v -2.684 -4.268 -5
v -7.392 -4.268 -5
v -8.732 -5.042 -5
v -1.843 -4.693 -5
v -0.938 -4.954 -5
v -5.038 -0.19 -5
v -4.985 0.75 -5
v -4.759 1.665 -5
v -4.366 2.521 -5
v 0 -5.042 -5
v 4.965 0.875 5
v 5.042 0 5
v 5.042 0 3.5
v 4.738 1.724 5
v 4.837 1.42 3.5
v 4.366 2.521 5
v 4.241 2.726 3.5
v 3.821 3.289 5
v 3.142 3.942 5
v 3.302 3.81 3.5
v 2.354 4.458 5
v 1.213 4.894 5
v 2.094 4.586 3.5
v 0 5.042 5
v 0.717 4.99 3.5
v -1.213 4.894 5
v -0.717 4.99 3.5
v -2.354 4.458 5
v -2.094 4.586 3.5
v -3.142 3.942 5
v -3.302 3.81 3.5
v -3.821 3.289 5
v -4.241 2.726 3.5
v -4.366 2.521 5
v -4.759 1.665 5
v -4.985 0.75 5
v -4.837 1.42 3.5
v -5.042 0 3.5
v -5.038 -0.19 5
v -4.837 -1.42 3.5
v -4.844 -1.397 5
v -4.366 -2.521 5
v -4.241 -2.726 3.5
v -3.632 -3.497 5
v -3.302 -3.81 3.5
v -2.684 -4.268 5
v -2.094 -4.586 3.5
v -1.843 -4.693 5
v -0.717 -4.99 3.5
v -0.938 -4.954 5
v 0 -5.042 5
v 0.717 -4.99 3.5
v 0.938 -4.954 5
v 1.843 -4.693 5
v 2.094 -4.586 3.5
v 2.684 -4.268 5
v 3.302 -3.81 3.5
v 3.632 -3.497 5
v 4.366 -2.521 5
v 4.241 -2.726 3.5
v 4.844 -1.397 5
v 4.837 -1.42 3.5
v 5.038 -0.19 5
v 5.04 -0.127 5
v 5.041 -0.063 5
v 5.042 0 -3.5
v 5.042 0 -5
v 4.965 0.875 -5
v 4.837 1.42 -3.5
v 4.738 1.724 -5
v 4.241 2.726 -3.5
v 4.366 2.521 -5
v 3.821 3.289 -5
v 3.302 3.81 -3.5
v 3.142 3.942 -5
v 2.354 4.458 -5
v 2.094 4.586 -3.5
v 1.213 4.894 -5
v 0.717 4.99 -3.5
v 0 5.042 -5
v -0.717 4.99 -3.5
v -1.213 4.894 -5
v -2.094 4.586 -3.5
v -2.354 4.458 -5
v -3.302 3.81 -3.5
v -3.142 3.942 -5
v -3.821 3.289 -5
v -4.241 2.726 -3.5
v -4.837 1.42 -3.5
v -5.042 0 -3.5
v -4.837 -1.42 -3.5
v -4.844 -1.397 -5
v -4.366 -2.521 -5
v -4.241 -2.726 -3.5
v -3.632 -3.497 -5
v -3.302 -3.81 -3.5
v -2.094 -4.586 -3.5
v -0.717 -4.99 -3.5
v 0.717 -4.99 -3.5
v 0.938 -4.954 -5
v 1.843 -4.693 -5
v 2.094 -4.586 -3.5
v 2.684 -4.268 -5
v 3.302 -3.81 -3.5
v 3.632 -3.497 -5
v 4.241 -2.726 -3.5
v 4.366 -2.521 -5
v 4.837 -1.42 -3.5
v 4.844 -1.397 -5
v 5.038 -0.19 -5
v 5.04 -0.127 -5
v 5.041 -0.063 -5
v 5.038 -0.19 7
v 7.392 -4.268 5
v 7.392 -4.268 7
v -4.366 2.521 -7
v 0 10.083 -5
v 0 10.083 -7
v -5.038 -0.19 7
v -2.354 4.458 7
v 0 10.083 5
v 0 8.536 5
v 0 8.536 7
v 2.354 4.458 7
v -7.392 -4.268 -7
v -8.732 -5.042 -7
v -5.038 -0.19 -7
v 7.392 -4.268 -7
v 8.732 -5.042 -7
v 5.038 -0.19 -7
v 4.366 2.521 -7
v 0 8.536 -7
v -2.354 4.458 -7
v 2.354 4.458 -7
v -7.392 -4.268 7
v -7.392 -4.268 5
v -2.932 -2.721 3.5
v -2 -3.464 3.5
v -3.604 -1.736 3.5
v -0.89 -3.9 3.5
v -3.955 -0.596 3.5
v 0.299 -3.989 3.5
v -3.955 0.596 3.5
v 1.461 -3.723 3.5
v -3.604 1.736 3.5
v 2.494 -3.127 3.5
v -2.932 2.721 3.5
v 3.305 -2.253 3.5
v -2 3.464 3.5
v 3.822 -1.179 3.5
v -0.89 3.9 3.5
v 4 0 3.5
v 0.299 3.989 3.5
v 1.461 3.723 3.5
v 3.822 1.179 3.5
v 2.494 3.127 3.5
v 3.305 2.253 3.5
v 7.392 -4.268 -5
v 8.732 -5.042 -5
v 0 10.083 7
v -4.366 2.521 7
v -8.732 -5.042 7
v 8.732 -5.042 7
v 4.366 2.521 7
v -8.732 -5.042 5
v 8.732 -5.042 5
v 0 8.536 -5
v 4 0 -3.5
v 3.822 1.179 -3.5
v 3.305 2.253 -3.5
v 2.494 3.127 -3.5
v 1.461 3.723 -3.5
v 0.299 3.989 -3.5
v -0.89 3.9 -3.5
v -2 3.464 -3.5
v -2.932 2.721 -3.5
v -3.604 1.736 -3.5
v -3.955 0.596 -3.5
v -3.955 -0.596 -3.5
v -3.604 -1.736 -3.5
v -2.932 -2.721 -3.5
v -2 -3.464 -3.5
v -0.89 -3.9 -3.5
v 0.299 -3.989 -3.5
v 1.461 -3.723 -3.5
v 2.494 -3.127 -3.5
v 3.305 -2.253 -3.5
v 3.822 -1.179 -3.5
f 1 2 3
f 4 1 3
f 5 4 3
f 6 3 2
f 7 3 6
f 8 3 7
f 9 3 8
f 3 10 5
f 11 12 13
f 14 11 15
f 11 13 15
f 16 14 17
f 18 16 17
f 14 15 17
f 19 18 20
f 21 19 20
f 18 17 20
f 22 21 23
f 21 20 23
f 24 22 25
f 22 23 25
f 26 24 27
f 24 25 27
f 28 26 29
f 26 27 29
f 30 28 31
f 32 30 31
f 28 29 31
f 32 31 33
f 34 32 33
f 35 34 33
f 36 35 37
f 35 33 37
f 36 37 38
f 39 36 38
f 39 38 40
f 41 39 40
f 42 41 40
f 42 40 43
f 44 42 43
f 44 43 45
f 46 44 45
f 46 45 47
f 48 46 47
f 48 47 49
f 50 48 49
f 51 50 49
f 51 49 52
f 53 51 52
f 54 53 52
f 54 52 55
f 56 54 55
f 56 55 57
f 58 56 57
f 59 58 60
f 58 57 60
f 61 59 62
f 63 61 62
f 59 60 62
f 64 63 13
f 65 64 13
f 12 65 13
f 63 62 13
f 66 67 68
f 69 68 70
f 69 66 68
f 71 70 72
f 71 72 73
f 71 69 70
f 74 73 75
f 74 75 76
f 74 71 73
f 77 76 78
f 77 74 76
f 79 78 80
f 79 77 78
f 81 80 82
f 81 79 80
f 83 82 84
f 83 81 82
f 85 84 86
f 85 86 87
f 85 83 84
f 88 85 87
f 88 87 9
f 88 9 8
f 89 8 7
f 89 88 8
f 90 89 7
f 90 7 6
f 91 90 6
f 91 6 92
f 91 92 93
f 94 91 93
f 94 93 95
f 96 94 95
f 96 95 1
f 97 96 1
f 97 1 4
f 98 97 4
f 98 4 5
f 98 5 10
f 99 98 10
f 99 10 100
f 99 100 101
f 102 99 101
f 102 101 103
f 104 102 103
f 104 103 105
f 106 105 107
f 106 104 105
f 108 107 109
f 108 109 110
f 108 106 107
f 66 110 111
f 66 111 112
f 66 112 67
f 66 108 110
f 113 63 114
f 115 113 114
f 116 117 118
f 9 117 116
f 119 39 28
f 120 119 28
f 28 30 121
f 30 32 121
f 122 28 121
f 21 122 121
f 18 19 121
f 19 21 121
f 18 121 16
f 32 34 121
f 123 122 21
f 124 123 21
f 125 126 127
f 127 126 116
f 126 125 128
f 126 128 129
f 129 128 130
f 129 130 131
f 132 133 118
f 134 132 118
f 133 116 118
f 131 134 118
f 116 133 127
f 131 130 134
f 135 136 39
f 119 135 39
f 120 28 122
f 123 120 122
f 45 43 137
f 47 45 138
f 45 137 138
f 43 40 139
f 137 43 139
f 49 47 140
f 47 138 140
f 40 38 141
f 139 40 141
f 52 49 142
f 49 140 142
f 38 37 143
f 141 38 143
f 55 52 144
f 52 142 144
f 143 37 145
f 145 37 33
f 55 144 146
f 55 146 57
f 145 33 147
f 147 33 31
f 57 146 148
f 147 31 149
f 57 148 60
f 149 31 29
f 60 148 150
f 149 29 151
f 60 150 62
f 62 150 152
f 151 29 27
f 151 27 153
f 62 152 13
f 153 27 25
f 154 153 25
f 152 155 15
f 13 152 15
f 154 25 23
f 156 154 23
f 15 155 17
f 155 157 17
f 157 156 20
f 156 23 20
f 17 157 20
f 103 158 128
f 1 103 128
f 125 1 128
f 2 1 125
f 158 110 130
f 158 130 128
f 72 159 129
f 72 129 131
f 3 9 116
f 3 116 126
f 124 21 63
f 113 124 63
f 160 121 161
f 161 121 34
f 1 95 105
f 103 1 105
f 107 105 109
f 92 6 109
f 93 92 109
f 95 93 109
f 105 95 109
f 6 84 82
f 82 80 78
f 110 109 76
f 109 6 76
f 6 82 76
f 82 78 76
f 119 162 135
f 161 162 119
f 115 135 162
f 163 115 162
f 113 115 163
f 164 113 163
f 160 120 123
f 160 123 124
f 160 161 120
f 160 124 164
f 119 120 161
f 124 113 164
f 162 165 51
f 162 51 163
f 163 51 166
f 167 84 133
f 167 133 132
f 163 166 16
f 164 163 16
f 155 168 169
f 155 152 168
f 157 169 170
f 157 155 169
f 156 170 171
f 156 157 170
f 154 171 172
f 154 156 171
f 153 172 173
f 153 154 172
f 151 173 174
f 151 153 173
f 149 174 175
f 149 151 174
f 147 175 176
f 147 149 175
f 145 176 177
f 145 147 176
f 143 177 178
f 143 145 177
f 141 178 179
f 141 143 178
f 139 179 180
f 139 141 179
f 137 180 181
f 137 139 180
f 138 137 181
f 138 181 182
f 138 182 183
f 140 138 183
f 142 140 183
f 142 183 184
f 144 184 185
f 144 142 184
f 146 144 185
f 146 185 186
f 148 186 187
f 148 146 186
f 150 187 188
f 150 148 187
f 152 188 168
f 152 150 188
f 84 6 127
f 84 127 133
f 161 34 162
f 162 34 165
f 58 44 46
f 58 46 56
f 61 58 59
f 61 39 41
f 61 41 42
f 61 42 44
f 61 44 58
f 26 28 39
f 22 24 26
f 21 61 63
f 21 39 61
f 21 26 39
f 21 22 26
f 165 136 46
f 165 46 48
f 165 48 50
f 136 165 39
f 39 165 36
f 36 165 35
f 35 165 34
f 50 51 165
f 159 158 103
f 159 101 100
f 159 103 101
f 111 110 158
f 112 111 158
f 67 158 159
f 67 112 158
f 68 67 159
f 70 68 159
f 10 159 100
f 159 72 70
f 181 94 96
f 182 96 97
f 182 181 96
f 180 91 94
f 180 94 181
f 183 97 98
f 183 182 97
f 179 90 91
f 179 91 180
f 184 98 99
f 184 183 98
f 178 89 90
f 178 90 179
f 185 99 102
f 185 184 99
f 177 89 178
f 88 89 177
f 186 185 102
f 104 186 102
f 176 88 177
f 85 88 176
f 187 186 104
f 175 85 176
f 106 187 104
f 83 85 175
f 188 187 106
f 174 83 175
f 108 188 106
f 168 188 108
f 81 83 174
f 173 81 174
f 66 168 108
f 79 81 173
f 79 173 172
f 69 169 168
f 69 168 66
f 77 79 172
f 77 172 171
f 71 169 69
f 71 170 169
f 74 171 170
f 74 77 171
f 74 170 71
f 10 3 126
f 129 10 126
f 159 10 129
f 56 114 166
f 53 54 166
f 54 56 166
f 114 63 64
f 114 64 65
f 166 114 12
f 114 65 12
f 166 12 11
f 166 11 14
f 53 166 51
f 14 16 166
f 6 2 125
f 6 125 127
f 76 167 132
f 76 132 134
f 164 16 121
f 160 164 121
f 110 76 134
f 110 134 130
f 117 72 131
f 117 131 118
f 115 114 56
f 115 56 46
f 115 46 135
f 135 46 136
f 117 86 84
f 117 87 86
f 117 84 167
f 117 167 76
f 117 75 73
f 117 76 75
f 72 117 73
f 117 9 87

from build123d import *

# Parameters (mm, degrees)
F0_R     = 4
F1_DEPTH = 3.5
F2_R     = 5.0416218024
F2_R_2   = 4
F3_DEPTH = 1.5
F5_DEPTH = 2


with BuildPart() as f1:
    # F0 (on Top) → F1 (new body)
    with BuildSketch(Plane.XY):
        Circle(F0_R)
    extrude(amount=F1_DEPTH)

    # F2 (on face) → F3 (join)
    with BuildSketch(Plane.XY.offset(3.5)):
        Circle(F2_R)
        Circle(F2_R_2, mode=Mode.SUBTRACT)
        Circle(F2_R_2)
    extrude(amount=F3_DEPTH)

    # F4 (on face) → F5 (join)
    with BuildSketch(Plane.XY.offset(5)):
        with BuildLine():
            ThreePointArc((-2.3542444359, 4.4581928553), (-3.4970506358, 3.6316094571), (-4.3661725175, 2.5208109698))
            ThreePointArc((-4.3661725175, 2.5208109698), (-4.8935913453, 1.2127300373), (-5.0380304856, -0.1902609394))
            Line((-5.0380304856, -0.1902609394), (-2.3542444359, 4.4581928553))
        make_face()
        with BuildLine():
            ThreePointArc((-2.6837860497, -4.2679319158), (-1.3965406905, -4.8443394285), (0, -5.0416218024))
            ThreePointArc((0, -5.0416218024), (1.3965406905, -4.8443394285), (2.6837860497, -4.2679319158))
            Line((2.6837860497, -4.2679319158), (-2.6837860497, -4.2679319158))
        make_face()
        with BuildLine():
            ThreePointArc((5.0416218024, 0), (4.8698327257, 1.3048676647), (4.3661726358, 2.5208107651))
            ThreePointArc((4.3661726358, 2.5208107651), (3.497050721, 3.6316093751), (2.3542444359, 4.4581928553))
            Line((2.3542444359, 4.4581928553), (5.0380304856, -0.1902609394))
            ThreePointArc((5.0380304856, -0.1902609394), (5.0407238932, -0.0951474154), (5.0416218024, 0))
        make_face()
        with BuildLine():
            ThreePointArc((2.3542444359, 4.4581928553), (3.497050721, 3.6316093751), (4.3661726358, 2.5208107651))
            Line((4.3661726358, 2.5208107651), (0, 10.0832436048))
            Line((0, 10.0832436048), (-4.3661725175, 2.5208109698))
            ThreePointArc((-4.3661725175, 2.5208109698), (-3.4970506358, 3.6316094571), (-2.3542444359, 4.4581928553))
            Line((-2.3542444359, 4.4581928553), (0, 8.5358638316))
            Line((0, 8.5358638316), (2.3542444359, 4.4581928553))
        make_face()
        with BuildLine():
            Line((-8.7323451143, -5.0416218024), (0, -5.0416218024))
            ThreePointArc((0, -5.0416218024), (-1.3965406905, -4.8443394285), (-2.6837860497, -4.2679319158))
            Line((-2.6837860497, -4.2679319158), (-7.3922749214, -4.2679319158))
            Line((-7.3922749214, -4.2679319158), (-5.0380304856, -0.1902609394))
            ThreePointArc((-5.0380304856, -0.1902609394), (-4.8935913453, 1.2127300373), (-4.3661725175, 2.5208109698))
            Line((-4.3661725175, 2.5208109698), (-8.7323451143, -5.0416218024))
        make_face()
        with BuildLine():
            Line((0, -5.0416218024), (8.7323451143, -5.0416218024))
            Line((8.7323451143, -5.0416218024), (4.3661726358, 2.5208107651))
            ThreePointArc((4.3661726358, 2.5208107651), (4.8698327257, 1.3048676647), (5.0416218024, 0))
            ThreePointArc((5.0416218024, 0), (5.0407238932, -0.0951474154), (5.0380304856, -0.1902609394))
            Line((5.0380304856, -0.1902609394), (7.3922749214, -4.2679319158))
            Line((7.3922749214, -4.2679319158), (2.6837860497, -4.2679319158))
            ThreePointArc((2.6837860497, -4.2679319158), (1.3965406905, -4.8443394285), (0, -5.0416218024))
        make_face()
    extrude(amount=F5_DEPTH)

    # F6: F1 across plane


with BuildPart() as f1_1:
    add(f1.part)
    add(f1.part.mirror(Plane.XY))


solid = f1_1.part
